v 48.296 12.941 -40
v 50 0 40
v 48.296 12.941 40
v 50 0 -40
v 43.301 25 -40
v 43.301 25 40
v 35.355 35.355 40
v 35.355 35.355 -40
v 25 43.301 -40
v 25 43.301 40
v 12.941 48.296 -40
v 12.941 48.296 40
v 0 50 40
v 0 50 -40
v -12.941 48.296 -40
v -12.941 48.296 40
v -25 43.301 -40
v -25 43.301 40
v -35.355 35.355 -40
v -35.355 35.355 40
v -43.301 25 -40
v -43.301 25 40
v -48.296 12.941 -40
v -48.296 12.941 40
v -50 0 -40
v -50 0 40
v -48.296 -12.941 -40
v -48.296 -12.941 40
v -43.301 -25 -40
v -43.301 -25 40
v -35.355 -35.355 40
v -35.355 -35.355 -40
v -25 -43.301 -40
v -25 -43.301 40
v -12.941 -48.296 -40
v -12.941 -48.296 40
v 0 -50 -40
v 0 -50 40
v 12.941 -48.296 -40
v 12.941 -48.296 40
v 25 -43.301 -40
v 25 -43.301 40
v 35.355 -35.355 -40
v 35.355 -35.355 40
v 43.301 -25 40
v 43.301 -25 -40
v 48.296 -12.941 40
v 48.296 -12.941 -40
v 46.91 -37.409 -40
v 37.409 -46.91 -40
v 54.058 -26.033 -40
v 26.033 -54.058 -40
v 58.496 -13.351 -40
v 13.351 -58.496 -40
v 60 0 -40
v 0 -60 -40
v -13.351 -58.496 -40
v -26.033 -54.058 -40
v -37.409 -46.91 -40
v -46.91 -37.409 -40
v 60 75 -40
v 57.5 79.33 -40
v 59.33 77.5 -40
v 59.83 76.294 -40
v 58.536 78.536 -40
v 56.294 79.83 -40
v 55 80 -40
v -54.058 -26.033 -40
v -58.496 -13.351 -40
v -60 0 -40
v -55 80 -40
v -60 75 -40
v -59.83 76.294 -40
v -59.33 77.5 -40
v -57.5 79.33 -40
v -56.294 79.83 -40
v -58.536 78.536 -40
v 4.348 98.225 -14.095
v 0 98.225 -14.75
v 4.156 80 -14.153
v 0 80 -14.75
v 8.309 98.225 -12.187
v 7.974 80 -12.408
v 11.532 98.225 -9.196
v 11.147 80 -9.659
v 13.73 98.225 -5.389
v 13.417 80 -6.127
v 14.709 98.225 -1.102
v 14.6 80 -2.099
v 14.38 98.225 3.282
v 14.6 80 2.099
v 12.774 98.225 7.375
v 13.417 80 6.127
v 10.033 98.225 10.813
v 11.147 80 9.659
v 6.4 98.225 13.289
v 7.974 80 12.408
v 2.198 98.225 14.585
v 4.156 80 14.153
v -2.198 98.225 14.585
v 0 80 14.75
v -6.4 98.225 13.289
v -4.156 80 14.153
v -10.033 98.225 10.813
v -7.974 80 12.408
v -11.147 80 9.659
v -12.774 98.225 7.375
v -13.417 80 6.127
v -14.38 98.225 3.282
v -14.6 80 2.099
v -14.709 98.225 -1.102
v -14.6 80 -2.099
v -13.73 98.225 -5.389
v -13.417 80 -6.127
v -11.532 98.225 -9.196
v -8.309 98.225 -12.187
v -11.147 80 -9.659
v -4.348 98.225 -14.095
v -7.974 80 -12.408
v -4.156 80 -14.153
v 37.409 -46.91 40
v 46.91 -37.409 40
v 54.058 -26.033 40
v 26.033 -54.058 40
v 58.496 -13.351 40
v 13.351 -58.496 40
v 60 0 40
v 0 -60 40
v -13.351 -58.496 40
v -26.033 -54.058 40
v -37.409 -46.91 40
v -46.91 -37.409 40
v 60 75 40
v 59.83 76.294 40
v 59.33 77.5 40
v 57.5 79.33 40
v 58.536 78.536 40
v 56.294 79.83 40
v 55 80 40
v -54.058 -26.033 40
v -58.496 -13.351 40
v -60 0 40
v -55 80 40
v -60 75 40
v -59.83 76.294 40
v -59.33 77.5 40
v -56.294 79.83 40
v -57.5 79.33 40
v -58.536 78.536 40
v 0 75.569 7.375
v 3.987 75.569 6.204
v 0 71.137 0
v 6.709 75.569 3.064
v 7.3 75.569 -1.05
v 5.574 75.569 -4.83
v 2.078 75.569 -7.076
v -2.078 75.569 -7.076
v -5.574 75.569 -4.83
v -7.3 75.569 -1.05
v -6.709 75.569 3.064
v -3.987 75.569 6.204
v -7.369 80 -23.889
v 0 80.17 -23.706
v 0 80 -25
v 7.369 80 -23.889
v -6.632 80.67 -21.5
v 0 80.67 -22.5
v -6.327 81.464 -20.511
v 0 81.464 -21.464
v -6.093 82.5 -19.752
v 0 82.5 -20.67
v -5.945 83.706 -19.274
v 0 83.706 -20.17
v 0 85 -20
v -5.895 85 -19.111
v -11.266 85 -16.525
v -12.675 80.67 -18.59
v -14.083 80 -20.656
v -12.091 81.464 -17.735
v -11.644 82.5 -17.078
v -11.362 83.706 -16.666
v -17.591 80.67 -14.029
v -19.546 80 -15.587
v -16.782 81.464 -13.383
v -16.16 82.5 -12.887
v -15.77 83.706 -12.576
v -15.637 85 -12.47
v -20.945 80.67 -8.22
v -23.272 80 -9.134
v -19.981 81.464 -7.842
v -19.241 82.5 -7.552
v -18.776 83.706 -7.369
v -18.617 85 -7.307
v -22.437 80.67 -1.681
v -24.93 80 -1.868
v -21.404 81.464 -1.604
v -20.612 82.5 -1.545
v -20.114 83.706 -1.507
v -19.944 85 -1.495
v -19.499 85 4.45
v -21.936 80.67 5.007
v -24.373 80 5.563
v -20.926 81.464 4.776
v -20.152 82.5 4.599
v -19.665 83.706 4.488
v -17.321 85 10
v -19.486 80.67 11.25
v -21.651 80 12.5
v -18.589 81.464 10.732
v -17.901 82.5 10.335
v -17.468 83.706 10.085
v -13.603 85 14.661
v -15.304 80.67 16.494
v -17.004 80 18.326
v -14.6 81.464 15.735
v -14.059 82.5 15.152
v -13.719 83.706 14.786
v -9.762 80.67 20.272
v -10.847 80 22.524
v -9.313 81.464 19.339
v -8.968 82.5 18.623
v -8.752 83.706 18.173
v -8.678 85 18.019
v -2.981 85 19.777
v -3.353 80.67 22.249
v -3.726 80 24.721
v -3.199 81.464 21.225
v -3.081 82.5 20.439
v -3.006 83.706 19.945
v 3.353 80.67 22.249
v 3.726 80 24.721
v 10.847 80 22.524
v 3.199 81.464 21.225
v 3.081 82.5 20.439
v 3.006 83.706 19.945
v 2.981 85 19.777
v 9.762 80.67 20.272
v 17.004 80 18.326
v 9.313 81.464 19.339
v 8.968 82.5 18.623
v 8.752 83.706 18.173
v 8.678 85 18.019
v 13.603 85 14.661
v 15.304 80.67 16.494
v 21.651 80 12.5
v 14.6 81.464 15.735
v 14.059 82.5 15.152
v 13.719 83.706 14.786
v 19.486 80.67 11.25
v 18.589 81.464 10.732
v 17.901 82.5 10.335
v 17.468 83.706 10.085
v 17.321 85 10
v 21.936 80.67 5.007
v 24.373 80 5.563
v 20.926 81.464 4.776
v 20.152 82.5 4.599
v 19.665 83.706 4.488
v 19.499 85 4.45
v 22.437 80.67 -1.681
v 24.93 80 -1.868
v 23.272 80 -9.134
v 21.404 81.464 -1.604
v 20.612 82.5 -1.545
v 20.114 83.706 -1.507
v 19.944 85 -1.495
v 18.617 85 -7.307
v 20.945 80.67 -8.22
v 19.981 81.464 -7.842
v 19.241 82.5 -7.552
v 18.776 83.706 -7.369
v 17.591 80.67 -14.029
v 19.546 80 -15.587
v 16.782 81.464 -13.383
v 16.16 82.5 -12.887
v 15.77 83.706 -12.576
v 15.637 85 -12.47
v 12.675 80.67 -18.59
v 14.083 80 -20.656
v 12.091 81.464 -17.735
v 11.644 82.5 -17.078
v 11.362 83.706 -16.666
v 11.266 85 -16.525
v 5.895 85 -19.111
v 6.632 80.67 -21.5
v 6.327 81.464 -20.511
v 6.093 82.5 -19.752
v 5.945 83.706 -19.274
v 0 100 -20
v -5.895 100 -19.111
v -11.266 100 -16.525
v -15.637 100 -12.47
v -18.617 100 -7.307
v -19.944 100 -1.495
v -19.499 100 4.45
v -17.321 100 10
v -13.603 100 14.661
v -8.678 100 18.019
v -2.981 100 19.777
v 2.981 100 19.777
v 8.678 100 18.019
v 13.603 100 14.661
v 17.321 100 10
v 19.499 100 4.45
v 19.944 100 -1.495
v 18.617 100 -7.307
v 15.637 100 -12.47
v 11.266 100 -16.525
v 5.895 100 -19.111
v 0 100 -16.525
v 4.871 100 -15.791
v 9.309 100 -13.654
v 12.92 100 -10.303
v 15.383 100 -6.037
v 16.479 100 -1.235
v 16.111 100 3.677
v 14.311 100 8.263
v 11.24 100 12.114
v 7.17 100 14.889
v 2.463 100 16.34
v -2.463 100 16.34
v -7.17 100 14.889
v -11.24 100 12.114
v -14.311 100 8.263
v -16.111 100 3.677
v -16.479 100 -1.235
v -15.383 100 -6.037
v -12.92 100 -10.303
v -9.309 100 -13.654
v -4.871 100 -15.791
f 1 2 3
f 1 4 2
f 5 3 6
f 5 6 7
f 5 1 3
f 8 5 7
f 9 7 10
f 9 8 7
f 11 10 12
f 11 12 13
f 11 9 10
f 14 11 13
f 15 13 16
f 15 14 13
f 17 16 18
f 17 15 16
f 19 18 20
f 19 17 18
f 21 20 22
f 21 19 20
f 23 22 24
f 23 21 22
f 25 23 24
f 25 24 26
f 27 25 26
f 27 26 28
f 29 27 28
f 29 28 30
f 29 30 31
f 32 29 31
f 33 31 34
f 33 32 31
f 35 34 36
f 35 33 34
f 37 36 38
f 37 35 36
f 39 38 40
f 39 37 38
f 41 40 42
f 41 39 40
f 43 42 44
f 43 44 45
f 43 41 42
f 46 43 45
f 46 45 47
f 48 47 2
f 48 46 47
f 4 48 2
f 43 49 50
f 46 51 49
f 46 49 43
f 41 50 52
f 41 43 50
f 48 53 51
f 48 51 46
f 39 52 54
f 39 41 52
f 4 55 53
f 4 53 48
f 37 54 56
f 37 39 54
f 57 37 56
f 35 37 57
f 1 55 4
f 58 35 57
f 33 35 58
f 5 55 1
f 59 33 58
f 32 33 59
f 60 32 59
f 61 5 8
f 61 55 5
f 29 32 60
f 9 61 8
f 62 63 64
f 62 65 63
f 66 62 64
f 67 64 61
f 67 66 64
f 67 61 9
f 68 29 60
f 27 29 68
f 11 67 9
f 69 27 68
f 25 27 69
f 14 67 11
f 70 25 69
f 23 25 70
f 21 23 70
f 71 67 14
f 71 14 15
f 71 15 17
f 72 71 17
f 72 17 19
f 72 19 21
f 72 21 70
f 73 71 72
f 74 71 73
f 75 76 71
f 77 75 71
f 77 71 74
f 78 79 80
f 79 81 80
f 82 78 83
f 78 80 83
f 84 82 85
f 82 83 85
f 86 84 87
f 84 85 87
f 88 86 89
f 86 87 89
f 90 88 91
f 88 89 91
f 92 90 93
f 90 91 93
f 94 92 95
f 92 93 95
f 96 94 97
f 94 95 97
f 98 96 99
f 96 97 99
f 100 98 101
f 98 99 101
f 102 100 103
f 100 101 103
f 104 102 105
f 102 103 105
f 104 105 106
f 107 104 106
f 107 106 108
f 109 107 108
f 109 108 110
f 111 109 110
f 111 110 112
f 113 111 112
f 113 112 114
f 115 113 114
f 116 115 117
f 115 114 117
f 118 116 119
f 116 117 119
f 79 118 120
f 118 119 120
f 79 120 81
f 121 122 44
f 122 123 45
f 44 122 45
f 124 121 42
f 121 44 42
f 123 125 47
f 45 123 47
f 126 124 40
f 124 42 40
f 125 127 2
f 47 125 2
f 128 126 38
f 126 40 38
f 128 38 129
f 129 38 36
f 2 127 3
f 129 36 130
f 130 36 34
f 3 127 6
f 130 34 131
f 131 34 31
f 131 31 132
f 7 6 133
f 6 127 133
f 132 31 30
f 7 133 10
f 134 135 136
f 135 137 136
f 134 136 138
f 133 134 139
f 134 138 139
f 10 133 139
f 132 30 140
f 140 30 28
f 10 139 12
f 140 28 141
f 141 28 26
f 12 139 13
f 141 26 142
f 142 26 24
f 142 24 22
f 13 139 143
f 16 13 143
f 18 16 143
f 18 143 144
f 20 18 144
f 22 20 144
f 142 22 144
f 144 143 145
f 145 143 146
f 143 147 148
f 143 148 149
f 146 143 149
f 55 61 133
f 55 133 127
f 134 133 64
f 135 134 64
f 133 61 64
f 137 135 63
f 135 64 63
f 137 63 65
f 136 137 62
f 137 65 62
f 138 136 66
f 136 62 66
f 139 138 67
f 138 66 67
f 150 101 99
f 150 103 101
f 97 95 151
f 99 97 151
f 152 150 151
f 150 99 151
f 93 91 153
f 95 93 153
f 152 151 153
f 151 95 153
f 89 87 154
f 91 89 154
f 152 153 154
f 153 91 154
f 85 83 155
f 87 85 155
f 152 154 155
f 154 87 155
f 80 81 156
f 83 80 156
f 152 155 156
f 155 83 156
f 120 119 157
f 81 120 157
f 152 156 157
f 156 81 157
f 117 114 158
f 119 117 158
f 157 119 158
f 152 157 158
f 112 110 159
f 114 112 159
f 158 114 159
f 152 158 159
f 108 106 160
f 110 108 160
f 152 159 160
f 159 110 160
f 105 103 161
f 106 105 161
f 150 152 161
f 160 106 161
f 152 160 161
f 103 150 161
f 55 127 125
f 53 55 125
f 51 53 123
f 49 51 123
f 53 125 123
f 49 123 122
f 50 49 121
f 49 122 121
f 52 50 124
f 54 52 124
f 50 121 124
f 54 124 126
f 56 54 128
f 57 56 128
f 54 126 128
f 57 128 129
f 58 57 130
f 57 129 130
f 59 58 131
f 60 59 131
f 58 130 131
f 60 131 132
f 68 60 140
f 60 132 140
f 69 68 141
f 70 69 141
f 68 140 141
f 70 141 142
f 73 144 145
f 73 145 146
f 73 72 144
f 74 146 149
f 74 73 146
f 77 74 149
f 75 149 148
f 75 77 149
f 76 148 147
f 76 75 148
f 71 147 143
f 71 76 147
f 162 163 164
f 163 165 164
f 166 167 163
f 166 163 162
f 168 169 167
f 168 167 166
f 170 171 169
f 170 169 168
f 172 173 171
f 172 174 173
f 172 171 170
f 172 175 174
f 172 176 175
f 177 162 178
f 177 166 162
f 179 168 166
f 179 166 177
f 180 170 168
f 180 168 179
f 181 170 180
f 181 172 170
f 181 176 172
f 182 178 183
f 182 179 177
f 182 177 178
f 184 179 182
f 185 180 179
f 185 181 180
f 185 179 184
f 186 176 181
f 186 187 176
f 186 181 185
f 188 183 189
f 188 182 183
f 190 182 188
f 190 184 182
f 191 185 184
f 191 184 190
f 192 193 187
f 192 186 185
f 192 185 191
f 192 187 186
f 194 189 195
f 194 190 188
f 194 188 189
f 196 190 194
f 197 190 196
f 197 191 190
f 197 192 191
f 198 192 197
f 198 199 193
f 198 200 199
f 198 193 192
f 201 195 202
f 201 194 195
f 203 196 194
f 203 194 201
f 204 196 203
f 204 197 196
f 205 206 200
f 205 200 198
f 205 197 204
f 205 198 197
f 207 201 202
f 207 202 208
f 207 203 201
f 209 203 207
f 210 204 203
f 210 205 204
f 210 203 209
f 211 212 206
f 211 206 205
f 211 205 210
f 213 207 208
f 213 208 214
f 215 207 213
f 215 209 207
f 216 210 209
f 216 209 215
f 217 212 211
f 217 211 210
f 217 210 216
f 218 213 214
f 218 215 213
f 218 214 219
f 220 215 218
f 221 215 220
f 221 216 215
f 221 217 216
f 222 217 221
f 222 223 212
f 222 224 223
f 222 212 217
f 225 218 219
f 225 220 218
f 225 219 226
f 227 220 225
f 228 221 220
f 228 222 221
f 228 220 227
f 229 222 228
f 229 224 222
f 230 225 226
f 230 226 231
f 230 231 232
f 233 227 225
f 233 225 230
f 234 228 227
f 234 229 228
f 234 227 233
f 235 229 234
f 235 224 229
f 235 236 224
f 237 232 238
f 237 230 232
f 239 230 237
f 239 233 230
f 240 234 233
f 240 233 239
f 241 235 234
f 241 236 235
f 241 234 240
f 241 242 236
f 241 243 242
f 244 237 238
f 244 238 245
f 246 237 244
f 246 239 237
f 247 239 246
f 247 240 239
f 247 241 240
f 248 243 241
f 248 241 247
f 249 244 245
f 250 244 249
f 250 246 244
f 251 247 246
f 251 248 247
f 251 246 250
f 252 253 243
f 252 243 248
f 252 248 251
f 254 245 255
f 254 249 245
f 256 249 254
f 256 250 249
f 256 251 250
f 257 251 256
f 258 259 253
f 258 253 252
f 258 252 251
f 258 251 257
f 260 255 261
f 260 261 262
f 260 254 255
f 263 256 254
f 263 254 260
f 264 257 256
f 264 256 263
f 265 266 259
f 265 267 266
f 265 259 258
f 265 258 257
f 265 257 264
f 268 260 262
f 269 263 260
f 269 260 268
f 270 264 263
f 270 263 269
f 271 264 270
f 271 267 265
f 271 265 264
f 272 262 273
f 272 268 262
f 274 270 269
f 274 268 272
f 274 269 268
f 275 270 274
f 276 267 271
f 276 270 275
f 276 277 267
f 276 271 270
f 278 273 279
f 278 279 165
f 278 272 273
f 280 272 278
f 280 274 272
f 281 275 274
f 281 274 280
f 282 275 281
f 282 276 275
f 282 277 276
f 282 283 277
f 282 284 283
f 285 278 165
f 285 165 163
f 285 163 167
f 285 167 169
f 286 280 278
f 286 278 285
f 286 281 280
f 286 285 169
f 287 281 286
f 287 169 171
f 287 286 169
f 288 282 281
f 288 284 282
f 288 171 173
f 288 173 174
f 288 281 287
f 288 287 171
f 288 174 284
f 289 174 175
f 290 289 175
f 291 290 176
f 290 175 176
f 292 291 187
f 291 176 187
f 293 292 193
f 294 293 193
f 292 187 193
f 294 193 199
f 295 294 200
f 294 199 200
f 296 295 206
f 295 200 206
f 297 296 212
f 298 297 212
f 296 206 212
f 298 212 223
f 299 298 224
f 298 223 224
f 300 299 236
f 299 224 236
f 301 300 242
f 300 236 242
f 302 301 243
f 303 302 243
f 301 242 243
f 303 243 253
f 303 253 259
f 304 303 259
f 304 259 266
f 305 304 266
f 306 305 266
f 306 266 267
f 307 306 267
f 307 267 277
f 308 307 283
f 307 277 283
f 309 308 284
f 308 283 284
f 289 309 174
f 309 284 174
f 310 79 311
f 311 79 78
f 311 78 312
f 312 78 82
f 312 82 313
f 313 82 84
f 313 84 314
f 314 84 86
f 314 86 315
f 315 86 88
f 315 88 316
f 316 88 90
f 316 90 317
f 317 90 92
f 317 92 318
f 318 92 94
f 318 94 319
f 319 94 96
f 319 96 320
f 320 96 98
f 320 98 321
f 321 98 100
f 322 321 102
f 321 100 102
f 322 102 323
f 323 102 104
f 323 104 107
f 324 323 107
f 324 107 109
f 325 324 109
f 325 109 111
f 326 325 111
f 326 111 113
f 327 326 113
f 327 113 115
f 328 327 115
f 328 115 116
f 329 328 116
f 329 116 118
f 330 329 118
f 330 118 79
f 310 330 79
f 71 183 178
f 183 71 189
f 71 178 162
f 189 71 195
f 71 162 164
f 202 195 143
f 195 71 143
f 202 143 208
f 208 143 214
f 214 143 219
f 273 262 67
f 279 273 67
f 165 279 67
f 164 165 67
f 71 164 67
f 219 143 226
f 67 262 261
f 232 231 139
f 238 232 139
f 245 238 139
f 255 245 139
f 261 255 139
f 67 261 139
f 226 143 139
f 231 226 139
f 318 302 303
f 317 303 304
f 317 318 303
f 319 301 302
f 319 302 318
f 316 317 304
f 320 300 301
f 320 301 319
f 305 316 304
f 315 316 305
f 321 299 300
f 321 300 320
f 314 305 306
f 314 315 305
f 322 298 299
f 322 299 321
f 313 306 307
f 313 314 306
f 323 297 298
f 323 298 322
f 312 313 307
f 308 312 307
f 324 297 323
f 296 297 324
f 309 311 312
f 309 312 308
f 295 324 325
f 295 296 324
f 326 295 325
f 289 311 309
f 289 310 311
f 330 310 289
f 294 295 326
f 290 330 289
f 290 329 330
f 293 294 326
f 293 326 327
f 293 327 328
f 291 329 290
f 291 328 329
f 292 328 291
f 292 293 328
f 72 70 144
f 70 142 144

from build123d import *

# Parameters (mm, degrees)
SKETCH1_R                    = 50
BOSS_EXTRUDE1_DEPTH          = 40
FILLET1_R                    = 5
SKETCH2_R                    = 20
BOSS_EXTRUDE2_DEPTH          = 20
M33_TAPPED_HOLE1_D           = 29.5
M33_TAPPED_HOLE1_DEPTH       = 20
M33_TAPPED_HOLE1_CSINK_D     = 33.05
M33_TAPPED_HOLE1_CSINK_ANGLE = 90
M33_TAPPED_HOLE1_TIP         = 8.862694131
FILLET2_R                    = 5


with BuildPart() as part:
    # Sketch1 → Boss-Extrude1 (new, symmetric)
    with BuildSketch(Plane.XY):
        with BuildLine():
            Line((-60, 0), (-60, 80))
            Line((-60, 80), (60, 80))
            Line((60, 80), (60, 0))
            ThreePointArc((60, 0), (0, -60), (-60, 0))
        make_face()
        Circle(SKETCH1_R, mode=Mode.SUBTRACT)
    extrude(amount=BOSS_EXTRUDE1_DEPTH, both=True)

    # Fillet1
    fillet1_edges = [part.edges().sort_by_distance(p)[0] for p in [
        (-60, 80, 0),
        (60, 80, 0),
    ]]
    fillet(fillet1_edges, radius=FILLET1_R)

    # Sketch2 → Boss-Extrude2 (add)
    with BuildSketch(Plane(origin=(0, 80, 0), x_dir=(1, 0, 0), z_dir=(0, 1, 0))):
        with Locations(Location((0, 0, 0), (0, 0, 90))):
            Circle(SKETCH2_R)
    extrude(amount=BOSS_EXTRUDE2_DEPTH)

    # M33 Tapped Hole1
    with Locations(Plane.ZX.offset(100)):
        with Locations((0, 0)):
            CounterSinkHole(M33_TAPPED_HOLE1_D / 2, M33_TAPPED_HOLE1_CSINK_D / 2, depth=M33_TAPPED_HOLE1_DEPTH, counter_sink_angle=M33_TAPPED_HOLE1_CSINK_ANGLE)
            with Locations((0, 0, -(M33_TAPPED_HOLE1_DEPTH + M33_TAPPED_HOLE1_TIP / 2))):  # 118° drill point
                Cone(0, M33_TAPPED_HOLE1_D / 2, M33_TAPPED_HOLE1_TIP, mode=Mode.SUBTRACT)

    # Fillet2
    fillet2_edges = [part.edges().sort_by_distance(p)[0] for p in [
        (0, 80, 20),
    ]]
    fillet(fillet2_edges, radius=FILLET2_R)


solid = part.part
